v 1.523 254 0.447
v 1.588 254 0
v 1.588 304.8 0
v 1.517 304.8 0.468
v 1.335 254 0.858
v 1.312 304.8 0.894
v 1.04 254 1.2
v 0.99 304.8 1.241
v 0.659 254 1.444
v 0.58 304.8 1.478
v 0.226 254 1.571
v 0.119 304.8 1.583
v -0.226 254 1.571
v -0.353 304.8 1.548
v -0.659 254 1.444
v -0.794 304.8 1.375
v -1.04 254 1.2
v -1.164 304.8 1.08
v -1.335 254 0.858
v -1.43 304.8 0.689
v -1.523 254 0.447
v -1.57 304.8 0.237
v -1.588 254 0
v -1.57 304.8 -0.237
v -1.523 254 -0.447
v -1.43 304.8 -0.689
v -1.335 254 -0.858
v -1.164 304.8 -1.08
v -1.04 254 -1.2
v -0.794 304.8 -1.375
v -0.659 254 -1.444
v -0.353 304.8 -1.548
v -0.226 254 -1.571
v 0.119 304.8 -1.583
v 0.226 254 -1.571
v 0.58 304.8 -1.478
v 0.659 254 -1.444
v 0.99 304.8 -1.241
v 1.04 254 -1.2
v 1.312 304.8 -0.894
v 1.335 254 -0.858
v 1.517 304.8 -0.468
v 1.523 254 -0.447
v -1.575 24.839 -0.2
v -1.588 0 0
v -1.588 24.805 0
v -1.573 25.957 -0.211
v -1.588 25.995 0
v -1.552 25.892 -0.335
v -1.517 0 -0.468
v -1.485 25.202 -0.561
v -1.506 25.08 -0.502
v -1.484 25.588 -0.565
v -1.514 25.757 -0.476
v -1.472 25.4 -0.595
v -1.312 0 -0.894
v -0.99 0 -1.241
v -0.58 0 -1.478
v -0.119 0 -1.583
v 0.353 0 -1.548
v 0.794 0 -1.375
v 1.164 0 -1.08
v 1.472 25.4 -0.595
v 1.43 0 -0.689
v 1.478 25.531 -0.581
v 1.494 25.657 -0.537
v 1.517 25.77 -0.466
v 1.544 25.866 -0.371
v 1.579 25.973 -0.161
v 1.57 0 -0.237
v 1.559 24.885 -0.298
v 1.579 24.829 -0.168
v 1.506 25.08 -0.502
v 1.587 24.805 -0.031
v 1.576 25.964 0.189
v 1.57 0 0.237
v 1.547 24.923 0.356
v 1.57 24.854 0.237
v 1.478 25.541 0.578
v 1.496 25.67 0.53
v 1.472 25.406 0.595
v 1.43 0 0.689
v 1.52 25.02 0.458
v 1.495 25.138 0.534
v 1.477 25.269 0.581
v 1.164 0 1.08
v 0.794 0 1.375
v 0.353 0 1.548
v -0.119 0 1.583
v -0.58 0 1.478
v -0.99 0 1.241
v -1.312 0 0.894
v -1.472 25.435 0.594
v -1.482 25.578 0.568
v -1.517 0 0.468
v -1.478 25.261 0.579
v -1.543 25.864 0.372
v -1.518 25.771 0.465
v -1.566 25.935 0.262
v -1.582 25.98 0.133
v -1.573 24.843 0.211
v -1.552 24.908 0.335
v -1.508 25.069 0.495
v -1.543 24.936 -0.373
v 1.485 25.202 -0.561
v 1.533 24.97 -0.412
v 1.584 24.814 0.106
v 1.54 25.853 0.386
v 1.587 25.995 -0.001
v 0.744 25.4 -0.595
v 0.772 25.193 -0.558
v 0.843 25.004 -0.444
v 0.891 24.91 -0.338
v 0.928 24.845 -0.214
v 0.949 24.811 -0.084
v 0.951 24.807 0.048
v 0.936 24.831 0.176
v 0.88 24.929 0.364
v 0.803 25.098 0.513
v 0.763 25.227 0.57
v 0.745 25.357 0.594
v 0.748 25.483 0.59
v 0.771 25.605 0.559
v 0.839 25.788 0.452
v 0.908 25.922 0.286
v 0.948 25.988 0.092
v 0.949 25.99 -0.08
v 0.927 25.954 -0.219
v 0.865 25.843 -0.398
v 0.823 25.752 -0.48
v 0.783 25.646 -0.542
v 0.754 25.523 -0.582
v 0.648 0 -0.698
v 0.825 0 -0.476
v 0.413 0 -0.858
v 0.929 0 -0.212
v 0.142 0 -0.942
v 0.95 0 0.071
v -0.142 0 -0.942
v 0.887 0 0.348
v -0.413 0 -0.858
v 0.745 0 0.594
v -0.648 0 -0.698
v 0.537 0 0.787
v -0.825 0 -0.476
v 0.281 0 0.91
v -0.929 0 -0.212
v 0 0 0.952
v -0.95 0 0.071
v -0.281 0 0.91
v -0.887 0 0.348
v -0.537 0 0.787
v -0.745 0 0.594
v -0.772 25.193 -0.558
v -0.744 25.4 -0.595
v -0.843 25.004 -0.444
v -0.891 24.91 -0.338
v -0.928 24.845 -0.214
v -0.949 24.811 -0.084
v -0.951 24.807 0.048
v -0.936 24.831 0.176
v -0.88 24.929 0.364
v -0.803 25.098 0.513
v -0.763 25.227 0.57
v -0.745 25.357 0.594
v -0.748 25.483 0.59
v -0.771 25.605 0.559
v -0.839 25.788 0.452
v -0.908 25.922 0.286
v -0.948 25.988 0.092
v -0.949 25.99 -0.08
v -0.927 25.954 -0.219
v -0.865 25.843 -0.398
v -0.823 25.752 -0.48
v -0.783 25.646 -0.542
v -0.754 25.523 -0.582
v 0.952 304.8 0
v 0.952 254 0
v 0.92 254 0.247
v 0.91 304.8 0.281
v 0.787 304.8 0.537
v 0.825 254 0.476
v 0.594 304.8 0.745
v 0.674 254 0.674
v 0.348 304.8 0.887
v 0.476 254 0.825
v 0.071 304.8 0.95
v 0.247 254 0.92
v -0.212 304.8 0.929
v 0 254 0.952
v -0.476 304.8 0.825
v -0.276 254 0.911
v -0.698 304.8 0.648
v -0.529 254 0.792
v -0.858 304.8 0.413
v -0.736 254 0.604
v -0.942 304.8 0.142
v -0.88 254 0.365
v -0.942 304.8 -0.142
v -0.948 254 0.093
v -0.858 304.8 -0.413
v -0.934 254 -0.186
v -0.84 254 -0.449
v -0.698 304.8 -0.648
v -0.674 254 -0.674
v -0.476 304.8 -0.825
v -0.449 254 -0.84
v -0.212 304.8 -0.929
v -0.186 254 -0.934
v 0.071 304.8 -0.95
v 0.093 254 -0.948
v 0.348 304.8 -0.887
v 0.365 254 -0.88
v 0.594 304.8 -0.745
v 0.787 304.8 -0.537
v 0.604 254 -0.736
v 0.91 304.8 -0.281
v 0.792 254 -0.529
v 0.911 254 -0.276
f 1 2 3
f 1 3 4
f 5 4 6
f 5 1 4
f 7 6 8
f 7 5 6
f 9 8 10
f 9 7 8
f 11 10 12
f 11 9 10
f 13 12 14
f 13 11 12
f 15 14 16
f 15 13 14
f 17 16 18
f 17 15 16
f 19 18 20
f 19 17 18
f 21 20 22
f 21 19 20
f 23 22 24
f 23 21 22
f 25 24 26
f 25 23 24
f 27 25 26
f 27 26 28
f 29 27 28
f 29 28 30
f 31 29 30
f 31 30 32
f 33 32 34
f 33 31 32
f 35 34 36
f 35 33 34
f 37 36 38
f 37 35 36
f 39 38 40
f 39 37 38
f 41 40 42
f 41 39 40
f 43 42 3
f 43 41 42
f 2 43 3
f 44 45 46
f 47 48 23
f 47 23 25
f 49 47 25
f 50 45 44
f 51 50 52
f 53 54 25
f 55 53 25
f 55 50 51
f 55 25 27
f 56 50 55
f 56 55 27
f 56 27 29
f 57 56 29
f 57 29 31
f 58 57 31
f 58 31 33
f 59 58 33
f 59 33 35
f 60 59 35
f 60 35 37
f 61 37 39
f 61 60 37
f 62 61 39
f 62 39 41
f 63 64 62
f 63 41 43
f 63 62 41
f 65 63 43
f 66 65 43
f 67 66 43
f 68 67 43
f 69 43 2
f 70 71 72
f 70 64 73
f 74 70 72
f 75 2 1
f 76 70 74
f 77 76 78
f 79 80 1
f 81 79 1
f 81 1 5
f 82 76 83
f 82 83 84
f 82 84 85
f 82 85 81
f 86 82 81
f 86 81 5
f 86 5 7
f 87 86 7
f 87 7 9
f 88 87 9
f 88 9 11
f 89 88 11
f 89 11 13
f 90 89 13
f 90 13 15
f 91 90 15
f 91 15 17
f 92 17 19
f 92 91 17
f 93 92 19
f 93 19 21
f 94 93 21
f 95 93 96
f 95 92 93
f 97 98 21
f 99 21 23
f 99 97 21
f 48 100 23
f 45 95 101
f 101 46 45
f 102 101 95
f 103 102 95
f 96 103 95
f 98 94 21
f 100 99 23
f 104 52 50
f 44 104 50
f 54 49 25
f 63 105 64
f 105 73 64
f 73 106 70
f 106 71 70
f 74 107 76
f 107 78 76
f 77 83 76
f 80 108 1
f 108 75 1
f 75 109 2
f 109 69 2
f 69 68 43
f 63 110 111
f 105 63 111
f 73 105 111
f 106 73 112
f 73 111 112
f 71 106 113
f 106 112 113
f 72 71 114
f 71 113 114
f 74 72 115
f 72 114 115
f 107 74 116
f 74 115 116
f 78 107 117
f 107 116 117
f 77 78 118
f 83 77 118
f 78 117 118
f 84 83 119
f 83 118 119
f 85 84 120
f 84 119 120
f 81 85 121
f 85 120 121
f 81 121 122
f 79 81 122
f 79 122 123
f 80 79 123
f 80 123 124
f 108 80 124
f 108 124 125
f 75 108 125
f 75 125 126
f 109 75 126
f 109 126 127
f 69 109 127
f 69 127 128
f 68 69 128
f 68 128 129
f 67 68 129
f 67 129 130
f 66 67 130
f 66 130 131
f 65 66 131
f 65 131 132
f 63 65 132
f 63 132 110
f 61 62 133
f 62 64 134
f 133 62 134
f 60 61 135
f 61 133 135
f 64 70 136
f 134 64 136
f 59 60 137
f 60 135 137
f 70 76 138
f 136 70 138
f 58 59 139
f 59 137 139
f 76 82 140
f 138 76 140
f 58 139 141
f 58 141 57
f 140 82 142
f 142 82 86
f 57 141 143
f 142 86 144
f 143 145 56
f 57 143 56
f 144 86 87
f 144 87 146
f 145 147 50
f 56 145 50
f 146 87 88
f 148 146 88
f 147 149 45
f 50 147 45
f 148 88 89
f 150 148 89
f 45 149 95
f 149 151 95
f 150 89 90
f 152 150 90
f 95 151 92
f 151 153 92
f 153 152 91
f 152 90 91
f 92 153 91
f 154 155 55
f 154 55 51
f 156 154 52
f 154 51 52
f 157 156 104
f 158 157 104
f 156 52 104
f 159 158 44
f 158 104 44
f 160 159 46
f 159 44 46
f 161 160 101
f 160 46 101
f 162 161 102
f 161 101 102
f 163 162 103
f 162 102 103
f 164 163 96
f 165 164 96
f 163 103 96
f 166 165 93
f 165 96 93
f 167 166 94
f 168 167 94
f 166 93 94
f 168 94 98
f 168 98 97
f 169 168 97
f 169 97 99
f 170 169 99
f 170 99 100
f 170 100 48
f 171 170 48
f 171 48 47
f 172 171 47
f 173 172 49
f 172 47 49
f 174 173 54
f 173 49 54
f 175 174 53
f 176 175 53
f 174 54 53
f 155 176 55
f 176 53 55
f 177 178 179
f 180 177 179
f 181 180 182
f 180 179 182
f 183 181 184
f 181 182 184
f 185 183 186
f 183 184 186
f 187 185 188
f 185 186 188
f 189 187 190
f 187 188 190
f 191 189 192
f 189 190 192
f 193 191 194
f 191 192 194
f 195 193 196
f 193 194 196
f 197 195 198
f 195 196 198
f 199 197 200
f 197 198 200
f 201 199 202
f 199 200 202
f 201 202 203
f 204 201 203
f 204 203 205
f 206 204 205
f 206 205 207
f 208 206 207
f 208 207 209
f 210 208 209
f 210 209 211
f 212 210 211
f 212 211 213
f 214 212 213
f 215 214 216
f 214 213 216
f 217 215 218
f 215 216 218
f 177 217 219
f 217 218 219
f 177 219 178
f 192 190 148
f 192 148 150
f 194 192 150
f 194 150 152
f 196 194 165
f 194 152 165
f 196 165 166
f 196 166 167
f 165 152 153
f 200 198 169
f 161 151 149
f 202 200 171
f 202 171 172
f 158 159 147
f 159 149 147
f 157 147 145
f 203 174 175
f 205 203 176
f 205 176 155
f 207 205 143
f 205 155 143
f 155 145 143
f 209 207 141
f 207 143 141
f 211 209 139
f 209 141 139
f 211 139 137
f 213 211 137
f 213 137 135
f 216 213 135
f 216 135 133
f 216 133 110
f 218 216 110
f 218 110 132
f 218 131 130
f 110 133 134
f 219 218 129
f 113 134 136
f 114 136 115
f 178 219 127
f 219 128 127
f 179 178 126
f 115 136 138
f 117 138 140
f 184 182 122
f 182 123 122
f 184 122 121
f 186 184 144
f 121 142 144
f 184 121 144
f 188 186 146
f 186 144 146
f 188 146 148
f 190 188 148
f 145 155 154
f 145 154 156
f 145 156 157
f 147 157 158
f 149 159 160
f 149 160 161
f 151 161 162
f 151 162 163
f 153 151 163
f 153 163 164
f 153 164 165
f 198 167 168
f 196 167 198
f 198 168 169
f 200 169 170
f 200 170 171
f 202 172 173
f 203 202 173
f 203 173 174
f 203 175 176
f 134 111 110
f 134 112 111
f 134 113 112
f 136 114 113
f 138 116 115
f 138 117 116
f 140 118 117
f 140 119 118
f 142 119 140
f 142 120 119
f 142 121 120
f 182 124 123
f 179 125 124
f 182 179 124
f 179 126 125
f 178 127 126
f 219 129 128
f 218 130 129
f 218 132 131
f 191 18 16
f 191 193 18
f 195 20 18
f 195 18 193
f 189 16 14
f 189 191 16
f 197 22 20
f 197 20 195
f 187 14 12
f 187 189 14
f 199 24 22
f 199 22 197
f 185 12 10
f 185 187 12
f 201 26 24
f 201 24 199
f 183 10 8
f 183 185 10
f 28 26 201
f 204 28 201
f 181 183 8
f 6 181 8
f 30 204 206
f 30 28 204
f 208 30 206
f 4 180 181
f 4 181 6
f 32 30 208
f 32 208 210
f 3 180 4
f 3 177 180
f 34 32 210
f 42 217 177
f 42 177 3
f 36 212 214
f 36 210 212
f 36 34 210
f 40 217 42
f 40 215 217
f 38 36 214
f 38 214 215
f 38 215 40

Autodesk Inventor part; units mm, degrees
ref_plane "YZ Plane" through (0, 0, 0) normal (1, 0, 0) x (0, 1, 0)
ref_plane "XZ Plane" through (0, 0, 0) normal (0, 1, 0) x (-1, 0, 0)
ref_plane "XY Plane" through (0, 0, 0) normal (0, 0, 1) x (1, 0, 0)
sketch "Sketch1" plane through (0, 0, 0) normal (0, 1, 0) x (-1, 0, 0)
  circle A0 centre (0, 0) radius 1.5875
  dimension "d0" = 3.175
extrude "Extrusion1" add sketch "Sketch1" along normal blind 254
sketch "Sketch9" plane through (0, 0, 0) normal (1, 0, 0) x (0, 1, 0)
  line L0 (0, -1.5875) -> (0, 1.5875) projected
  line L1 (254, -1.5875) -> (254, 1.5875) projected
  line L2 (254, 0) -> (228.6, 0)
  line L3 (0, 0) -> (25.4, 0)
  dimension "d42" = 25.4
  dimension "d43" = 25.4
hole "Hole5" at (0, 25.4, 0) direction (-1, 0, 0) diameter 1.1906 end through all both
hole "Hole6" [suppressed]
sketch "Sketch10" plane through (0, 254, 0) normal (0, 1, 0) x (1, 0, 0)
  circle A0 centre (0, 0) radius 1.5875 projected
hole "Hole7" at (0, 254, 0) direction (0, -1, 0) diameter 1.905 end through all
thread "Thread28" size "M3.5x0.6" class "6g" standard "ISO Metric profile" length 6.35 offset 27.94
thread "Thread29" size "M3.5x0.6" class "6g" standard "ISO Metric profile" length 6.35 offset 39.878
thread "Thread30" size "M3.5x0.6" class "6g" standard "ISO Metric profile" length 6.35 offset 51.816
thread "Thread31" size "M3.5x0.6" class "6g" standard "ISO Metric profile" length 6.35 offset 63.754
thread "Thread32" size "M3.5x0.6" class "6g" standard "ISO Metric profile" length 6.35 offset 75.692
thread "Thread33" size "M3.5x0.6" class "6g" standard "ISO Metric profile" length 6.35 offset 87.63
thread "Thread34" size "M3.5x0.6" class "6g" standard "ISO Metric profile" length 6.35 offset 99.568
thread "Thread35" size "M3.5x0.6" class "6g" standard "ISO Metric profile" length 6.35 offset 111.506
thread "Thread36" size "M3.5x0.6" class "6g" standard "ISO Metric profile" length 6.35 offset 122.936
thread "Thread37" size "M3.5x0.6" class "6g" standard "ISO Metric profile" length 6.35 offset 134.112
thread "Thread38" size "M3.5x0.6" class "6g" standard "ISO Metric profile" length 22.86
sketch "Sketch14" plane through (0, 254, 0) normal (0, 1, 0) x (1, 0, 0)
  circle A0 centre (0, 0) radius 1.5875 projected
  circle A1 centre (0, 0) radius 0.9525 projected
extrude "Extrusion3" add sketch "Sketch14" along normal blind 50.8
thread "Thread39" size "M3.5x0.6" class "6g" standard "ISO Metric profile" length 12.7
properties part number "burder_rod_2"
